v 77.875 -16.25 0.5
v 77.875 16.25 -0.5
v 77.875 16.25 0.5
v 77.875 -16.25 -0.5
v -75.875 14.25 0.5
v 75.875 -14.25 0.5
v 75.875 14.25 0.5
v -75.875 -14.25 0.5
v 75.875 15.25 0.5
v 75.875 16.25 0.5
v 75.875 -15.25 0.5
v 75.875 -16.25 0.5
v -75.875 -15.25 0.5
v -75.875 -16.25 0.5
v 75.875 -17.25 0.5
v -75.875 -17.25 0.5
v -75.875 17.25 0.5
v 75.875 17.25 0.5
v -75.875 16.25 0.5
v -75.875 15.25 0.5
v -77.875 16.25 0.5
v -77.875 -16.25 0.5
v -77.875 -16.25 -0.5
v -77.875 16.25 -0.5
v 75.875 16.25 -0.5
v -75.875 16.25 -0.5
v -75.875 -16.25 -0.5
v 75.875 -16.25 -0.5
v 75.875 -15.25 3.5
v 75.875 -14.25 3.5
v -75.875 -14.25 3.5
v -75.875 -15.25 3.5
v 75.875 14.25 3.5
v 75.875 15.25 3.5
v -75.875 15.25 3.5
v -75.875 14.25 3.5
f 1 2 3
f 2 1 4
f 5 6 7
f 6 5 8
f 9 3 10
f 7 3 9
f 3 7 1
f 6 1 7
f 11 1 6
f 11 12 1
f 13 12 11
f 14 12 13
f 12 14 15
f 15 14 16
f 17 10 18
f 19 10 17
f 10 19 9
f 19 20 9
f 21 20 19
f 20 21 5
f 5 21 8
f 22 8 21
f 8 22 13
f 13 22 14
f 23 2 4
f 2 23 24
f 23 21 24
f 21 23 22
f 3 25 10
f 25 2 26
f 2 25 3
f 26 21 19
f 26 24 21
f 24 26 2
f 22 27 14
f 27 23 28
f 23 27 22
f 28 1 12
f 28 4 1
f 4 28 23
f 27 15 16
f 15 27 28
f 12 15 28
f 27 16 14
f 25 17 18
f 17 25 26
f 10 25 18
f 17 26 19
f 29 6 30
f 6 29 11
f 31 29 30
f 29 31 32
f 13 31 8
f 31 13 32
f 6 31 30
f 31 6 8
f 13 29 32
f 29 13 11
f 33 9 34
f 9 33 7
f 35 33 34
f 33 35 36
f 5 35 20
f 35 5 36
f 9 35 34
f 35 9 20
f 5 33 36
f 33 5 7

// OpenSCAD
// file: mod_prism.scad
/// @file mod_prism.scad
///
/// @author © Dave Harris 2022
///

// points   1        ^
//        / | \      |
//       /  4  \     h
//      /  / \  \    |
//     0--/---\--2   v
//   w | /     \ | 
//     3---------5
//     <lLH><lRH>


module prism(h=20, lLH=15, lRH=25, w=1)
{
 polyhedron(
  points=[
   [0, 0, 0]       // 0 back LH corner
  ,[lLH, h, 0]     // 1 back peak
  ,[lLH+lRH, 0, 0] // 2 back RH corner
  ,[0, 0, w]       // 3 front LH corner
  ,[lLH, h, w]     // 4 front peak
  ,[lLH+lRH, 0, w] // 5 front RH corner
  ]
  , faces=[
    [0, 3, 5, 2] // bottom
   ,[0, 1, 4, 3] // LH ramp
   ,[1, 2, 5, 4] // RH ramp 
   ,[2, 1, 0]    // back wall
   ,[3, 4, 5]    // front wall
   ]
 );
} // end of module prism()

// local test prism
prism(lLH=1, lRH= 22, h=18, w=1 );

// eof
// file: fb_globals.scad
/// @file fb_globals.scad
///
/// @brief project footbridge globals
///
/// @author © Dave Harris 2022
///
/// Included in all project files.


$fa = 1;   // Fragment angle
$fs = 0.4; // Fragment size resolution

// global constants
//------------------

H_canopy = 47;

H_bridge = 49.5; // platform<>bridge
W_bridge = 36;   // width of bridge
                 // > walkway
W_walk   = 34.5; // width
H_walk   = 36;   // height of walkway


Steps    = 27;   // number of steps
W_stairs = 32;   // width ~ 9'6" @ H0
L_tread  = 3.5;  // tread ~ 12" @ H0
L_stairs = L_tread * (Steps +1);
H_rise   = H_bridge / (Steps +1); 
  // rise is 1.7678, not H0 1.75 (6")

W_lift   = 34;

W_build  = W_stairs +2;
L_build  = L_stairs+W_bridge+W_lift +2;

W_pillar = 4;

L_spacing = L_build /2;

Spans = 6;

L_canopy = ((Spans -1) * L_spacing) + W_pillar;

echo("len",L_canopy);

H_door   = 28;
W_door   = 18;

H_window = 6;
W_window = 16;


W_plat45  = 93.9;
W_track34 = 87.9;
W_plat23  = 93.8;
W_track12 = 87.9;

W_plat23edge =
   ( W_plat23 - W_stairs +2 ) /2 ;
W_plat45edge =
   ( W_plat45 - W_stairs +2 ) /2 ;
   
L_span34 = W_track34 + W_plat45edge + W_plat23edge;

L_span12 = 136.5;

W_grider = 2.2;

W_LEDstrip = 7.5;



// eof
// main file
/// @file fb_spanFloor.scad
///
/// @brief footbridge span floor
///
/// @author © Dave Harris 2022
///

include<fb_globals.scad>

use<mod_prism.scad>


spanFloor( L_span34, W_walk );

//color( "blue" // show centerline
//) cube(
//    [ L_span34 +4.1
//    , W_walk
//    , 0.0001 ], center=true
//  );



module spanFloor( length
                , width
                , W_girder = 2.0
                , W_tab    = 1.0
                , H_tab    = 3.0
                , thick    = 1.0
                , endHang  = 2.0
       )
{
  echo("spanFloor", length, width );


    cube(  // floor plate
      [ length + (endHang *2)
      , width - (thick *2) +0.001
      , thick  ], center = true
    );

    translate(  // chamfer edge 1
      [ -(length /2)
      , thick - (width /2)
      , -(thick /2)  ]
    ) rotate(
        [ 90
        , -90
        , 90  ]
      ) prism(
            lLH = thick
          , lRH = 0
          , w =   length
          , h =   thick
        );

    translate(  // chamfer edge 2
      [ -(length /2)
      , (width /2)
      , (thick /2)  ]
    ) rotate(
        [ 90
        , 180
        , 90  ]
      ) prism(
            lLH = thick
          , lRH = 0
          , w =   length
          , h =   thick
        );

    translate( // side tab support 1
      [ -(length /2)
      , -(width /2) + W_girder
      , -(thick /2)  ]
    ) cube(
        [ length
        , W_tab
        , thick + H_tab  ]
      );

    translate( // side tab support 2
      [ -(length /2)
      , (width /2) - W_girder - W_tab
      , -(thick /2)  ]
    ) cube(
        [ length
        , W_tab
        , thick + H_tab  ]
      );
}


// eof   
